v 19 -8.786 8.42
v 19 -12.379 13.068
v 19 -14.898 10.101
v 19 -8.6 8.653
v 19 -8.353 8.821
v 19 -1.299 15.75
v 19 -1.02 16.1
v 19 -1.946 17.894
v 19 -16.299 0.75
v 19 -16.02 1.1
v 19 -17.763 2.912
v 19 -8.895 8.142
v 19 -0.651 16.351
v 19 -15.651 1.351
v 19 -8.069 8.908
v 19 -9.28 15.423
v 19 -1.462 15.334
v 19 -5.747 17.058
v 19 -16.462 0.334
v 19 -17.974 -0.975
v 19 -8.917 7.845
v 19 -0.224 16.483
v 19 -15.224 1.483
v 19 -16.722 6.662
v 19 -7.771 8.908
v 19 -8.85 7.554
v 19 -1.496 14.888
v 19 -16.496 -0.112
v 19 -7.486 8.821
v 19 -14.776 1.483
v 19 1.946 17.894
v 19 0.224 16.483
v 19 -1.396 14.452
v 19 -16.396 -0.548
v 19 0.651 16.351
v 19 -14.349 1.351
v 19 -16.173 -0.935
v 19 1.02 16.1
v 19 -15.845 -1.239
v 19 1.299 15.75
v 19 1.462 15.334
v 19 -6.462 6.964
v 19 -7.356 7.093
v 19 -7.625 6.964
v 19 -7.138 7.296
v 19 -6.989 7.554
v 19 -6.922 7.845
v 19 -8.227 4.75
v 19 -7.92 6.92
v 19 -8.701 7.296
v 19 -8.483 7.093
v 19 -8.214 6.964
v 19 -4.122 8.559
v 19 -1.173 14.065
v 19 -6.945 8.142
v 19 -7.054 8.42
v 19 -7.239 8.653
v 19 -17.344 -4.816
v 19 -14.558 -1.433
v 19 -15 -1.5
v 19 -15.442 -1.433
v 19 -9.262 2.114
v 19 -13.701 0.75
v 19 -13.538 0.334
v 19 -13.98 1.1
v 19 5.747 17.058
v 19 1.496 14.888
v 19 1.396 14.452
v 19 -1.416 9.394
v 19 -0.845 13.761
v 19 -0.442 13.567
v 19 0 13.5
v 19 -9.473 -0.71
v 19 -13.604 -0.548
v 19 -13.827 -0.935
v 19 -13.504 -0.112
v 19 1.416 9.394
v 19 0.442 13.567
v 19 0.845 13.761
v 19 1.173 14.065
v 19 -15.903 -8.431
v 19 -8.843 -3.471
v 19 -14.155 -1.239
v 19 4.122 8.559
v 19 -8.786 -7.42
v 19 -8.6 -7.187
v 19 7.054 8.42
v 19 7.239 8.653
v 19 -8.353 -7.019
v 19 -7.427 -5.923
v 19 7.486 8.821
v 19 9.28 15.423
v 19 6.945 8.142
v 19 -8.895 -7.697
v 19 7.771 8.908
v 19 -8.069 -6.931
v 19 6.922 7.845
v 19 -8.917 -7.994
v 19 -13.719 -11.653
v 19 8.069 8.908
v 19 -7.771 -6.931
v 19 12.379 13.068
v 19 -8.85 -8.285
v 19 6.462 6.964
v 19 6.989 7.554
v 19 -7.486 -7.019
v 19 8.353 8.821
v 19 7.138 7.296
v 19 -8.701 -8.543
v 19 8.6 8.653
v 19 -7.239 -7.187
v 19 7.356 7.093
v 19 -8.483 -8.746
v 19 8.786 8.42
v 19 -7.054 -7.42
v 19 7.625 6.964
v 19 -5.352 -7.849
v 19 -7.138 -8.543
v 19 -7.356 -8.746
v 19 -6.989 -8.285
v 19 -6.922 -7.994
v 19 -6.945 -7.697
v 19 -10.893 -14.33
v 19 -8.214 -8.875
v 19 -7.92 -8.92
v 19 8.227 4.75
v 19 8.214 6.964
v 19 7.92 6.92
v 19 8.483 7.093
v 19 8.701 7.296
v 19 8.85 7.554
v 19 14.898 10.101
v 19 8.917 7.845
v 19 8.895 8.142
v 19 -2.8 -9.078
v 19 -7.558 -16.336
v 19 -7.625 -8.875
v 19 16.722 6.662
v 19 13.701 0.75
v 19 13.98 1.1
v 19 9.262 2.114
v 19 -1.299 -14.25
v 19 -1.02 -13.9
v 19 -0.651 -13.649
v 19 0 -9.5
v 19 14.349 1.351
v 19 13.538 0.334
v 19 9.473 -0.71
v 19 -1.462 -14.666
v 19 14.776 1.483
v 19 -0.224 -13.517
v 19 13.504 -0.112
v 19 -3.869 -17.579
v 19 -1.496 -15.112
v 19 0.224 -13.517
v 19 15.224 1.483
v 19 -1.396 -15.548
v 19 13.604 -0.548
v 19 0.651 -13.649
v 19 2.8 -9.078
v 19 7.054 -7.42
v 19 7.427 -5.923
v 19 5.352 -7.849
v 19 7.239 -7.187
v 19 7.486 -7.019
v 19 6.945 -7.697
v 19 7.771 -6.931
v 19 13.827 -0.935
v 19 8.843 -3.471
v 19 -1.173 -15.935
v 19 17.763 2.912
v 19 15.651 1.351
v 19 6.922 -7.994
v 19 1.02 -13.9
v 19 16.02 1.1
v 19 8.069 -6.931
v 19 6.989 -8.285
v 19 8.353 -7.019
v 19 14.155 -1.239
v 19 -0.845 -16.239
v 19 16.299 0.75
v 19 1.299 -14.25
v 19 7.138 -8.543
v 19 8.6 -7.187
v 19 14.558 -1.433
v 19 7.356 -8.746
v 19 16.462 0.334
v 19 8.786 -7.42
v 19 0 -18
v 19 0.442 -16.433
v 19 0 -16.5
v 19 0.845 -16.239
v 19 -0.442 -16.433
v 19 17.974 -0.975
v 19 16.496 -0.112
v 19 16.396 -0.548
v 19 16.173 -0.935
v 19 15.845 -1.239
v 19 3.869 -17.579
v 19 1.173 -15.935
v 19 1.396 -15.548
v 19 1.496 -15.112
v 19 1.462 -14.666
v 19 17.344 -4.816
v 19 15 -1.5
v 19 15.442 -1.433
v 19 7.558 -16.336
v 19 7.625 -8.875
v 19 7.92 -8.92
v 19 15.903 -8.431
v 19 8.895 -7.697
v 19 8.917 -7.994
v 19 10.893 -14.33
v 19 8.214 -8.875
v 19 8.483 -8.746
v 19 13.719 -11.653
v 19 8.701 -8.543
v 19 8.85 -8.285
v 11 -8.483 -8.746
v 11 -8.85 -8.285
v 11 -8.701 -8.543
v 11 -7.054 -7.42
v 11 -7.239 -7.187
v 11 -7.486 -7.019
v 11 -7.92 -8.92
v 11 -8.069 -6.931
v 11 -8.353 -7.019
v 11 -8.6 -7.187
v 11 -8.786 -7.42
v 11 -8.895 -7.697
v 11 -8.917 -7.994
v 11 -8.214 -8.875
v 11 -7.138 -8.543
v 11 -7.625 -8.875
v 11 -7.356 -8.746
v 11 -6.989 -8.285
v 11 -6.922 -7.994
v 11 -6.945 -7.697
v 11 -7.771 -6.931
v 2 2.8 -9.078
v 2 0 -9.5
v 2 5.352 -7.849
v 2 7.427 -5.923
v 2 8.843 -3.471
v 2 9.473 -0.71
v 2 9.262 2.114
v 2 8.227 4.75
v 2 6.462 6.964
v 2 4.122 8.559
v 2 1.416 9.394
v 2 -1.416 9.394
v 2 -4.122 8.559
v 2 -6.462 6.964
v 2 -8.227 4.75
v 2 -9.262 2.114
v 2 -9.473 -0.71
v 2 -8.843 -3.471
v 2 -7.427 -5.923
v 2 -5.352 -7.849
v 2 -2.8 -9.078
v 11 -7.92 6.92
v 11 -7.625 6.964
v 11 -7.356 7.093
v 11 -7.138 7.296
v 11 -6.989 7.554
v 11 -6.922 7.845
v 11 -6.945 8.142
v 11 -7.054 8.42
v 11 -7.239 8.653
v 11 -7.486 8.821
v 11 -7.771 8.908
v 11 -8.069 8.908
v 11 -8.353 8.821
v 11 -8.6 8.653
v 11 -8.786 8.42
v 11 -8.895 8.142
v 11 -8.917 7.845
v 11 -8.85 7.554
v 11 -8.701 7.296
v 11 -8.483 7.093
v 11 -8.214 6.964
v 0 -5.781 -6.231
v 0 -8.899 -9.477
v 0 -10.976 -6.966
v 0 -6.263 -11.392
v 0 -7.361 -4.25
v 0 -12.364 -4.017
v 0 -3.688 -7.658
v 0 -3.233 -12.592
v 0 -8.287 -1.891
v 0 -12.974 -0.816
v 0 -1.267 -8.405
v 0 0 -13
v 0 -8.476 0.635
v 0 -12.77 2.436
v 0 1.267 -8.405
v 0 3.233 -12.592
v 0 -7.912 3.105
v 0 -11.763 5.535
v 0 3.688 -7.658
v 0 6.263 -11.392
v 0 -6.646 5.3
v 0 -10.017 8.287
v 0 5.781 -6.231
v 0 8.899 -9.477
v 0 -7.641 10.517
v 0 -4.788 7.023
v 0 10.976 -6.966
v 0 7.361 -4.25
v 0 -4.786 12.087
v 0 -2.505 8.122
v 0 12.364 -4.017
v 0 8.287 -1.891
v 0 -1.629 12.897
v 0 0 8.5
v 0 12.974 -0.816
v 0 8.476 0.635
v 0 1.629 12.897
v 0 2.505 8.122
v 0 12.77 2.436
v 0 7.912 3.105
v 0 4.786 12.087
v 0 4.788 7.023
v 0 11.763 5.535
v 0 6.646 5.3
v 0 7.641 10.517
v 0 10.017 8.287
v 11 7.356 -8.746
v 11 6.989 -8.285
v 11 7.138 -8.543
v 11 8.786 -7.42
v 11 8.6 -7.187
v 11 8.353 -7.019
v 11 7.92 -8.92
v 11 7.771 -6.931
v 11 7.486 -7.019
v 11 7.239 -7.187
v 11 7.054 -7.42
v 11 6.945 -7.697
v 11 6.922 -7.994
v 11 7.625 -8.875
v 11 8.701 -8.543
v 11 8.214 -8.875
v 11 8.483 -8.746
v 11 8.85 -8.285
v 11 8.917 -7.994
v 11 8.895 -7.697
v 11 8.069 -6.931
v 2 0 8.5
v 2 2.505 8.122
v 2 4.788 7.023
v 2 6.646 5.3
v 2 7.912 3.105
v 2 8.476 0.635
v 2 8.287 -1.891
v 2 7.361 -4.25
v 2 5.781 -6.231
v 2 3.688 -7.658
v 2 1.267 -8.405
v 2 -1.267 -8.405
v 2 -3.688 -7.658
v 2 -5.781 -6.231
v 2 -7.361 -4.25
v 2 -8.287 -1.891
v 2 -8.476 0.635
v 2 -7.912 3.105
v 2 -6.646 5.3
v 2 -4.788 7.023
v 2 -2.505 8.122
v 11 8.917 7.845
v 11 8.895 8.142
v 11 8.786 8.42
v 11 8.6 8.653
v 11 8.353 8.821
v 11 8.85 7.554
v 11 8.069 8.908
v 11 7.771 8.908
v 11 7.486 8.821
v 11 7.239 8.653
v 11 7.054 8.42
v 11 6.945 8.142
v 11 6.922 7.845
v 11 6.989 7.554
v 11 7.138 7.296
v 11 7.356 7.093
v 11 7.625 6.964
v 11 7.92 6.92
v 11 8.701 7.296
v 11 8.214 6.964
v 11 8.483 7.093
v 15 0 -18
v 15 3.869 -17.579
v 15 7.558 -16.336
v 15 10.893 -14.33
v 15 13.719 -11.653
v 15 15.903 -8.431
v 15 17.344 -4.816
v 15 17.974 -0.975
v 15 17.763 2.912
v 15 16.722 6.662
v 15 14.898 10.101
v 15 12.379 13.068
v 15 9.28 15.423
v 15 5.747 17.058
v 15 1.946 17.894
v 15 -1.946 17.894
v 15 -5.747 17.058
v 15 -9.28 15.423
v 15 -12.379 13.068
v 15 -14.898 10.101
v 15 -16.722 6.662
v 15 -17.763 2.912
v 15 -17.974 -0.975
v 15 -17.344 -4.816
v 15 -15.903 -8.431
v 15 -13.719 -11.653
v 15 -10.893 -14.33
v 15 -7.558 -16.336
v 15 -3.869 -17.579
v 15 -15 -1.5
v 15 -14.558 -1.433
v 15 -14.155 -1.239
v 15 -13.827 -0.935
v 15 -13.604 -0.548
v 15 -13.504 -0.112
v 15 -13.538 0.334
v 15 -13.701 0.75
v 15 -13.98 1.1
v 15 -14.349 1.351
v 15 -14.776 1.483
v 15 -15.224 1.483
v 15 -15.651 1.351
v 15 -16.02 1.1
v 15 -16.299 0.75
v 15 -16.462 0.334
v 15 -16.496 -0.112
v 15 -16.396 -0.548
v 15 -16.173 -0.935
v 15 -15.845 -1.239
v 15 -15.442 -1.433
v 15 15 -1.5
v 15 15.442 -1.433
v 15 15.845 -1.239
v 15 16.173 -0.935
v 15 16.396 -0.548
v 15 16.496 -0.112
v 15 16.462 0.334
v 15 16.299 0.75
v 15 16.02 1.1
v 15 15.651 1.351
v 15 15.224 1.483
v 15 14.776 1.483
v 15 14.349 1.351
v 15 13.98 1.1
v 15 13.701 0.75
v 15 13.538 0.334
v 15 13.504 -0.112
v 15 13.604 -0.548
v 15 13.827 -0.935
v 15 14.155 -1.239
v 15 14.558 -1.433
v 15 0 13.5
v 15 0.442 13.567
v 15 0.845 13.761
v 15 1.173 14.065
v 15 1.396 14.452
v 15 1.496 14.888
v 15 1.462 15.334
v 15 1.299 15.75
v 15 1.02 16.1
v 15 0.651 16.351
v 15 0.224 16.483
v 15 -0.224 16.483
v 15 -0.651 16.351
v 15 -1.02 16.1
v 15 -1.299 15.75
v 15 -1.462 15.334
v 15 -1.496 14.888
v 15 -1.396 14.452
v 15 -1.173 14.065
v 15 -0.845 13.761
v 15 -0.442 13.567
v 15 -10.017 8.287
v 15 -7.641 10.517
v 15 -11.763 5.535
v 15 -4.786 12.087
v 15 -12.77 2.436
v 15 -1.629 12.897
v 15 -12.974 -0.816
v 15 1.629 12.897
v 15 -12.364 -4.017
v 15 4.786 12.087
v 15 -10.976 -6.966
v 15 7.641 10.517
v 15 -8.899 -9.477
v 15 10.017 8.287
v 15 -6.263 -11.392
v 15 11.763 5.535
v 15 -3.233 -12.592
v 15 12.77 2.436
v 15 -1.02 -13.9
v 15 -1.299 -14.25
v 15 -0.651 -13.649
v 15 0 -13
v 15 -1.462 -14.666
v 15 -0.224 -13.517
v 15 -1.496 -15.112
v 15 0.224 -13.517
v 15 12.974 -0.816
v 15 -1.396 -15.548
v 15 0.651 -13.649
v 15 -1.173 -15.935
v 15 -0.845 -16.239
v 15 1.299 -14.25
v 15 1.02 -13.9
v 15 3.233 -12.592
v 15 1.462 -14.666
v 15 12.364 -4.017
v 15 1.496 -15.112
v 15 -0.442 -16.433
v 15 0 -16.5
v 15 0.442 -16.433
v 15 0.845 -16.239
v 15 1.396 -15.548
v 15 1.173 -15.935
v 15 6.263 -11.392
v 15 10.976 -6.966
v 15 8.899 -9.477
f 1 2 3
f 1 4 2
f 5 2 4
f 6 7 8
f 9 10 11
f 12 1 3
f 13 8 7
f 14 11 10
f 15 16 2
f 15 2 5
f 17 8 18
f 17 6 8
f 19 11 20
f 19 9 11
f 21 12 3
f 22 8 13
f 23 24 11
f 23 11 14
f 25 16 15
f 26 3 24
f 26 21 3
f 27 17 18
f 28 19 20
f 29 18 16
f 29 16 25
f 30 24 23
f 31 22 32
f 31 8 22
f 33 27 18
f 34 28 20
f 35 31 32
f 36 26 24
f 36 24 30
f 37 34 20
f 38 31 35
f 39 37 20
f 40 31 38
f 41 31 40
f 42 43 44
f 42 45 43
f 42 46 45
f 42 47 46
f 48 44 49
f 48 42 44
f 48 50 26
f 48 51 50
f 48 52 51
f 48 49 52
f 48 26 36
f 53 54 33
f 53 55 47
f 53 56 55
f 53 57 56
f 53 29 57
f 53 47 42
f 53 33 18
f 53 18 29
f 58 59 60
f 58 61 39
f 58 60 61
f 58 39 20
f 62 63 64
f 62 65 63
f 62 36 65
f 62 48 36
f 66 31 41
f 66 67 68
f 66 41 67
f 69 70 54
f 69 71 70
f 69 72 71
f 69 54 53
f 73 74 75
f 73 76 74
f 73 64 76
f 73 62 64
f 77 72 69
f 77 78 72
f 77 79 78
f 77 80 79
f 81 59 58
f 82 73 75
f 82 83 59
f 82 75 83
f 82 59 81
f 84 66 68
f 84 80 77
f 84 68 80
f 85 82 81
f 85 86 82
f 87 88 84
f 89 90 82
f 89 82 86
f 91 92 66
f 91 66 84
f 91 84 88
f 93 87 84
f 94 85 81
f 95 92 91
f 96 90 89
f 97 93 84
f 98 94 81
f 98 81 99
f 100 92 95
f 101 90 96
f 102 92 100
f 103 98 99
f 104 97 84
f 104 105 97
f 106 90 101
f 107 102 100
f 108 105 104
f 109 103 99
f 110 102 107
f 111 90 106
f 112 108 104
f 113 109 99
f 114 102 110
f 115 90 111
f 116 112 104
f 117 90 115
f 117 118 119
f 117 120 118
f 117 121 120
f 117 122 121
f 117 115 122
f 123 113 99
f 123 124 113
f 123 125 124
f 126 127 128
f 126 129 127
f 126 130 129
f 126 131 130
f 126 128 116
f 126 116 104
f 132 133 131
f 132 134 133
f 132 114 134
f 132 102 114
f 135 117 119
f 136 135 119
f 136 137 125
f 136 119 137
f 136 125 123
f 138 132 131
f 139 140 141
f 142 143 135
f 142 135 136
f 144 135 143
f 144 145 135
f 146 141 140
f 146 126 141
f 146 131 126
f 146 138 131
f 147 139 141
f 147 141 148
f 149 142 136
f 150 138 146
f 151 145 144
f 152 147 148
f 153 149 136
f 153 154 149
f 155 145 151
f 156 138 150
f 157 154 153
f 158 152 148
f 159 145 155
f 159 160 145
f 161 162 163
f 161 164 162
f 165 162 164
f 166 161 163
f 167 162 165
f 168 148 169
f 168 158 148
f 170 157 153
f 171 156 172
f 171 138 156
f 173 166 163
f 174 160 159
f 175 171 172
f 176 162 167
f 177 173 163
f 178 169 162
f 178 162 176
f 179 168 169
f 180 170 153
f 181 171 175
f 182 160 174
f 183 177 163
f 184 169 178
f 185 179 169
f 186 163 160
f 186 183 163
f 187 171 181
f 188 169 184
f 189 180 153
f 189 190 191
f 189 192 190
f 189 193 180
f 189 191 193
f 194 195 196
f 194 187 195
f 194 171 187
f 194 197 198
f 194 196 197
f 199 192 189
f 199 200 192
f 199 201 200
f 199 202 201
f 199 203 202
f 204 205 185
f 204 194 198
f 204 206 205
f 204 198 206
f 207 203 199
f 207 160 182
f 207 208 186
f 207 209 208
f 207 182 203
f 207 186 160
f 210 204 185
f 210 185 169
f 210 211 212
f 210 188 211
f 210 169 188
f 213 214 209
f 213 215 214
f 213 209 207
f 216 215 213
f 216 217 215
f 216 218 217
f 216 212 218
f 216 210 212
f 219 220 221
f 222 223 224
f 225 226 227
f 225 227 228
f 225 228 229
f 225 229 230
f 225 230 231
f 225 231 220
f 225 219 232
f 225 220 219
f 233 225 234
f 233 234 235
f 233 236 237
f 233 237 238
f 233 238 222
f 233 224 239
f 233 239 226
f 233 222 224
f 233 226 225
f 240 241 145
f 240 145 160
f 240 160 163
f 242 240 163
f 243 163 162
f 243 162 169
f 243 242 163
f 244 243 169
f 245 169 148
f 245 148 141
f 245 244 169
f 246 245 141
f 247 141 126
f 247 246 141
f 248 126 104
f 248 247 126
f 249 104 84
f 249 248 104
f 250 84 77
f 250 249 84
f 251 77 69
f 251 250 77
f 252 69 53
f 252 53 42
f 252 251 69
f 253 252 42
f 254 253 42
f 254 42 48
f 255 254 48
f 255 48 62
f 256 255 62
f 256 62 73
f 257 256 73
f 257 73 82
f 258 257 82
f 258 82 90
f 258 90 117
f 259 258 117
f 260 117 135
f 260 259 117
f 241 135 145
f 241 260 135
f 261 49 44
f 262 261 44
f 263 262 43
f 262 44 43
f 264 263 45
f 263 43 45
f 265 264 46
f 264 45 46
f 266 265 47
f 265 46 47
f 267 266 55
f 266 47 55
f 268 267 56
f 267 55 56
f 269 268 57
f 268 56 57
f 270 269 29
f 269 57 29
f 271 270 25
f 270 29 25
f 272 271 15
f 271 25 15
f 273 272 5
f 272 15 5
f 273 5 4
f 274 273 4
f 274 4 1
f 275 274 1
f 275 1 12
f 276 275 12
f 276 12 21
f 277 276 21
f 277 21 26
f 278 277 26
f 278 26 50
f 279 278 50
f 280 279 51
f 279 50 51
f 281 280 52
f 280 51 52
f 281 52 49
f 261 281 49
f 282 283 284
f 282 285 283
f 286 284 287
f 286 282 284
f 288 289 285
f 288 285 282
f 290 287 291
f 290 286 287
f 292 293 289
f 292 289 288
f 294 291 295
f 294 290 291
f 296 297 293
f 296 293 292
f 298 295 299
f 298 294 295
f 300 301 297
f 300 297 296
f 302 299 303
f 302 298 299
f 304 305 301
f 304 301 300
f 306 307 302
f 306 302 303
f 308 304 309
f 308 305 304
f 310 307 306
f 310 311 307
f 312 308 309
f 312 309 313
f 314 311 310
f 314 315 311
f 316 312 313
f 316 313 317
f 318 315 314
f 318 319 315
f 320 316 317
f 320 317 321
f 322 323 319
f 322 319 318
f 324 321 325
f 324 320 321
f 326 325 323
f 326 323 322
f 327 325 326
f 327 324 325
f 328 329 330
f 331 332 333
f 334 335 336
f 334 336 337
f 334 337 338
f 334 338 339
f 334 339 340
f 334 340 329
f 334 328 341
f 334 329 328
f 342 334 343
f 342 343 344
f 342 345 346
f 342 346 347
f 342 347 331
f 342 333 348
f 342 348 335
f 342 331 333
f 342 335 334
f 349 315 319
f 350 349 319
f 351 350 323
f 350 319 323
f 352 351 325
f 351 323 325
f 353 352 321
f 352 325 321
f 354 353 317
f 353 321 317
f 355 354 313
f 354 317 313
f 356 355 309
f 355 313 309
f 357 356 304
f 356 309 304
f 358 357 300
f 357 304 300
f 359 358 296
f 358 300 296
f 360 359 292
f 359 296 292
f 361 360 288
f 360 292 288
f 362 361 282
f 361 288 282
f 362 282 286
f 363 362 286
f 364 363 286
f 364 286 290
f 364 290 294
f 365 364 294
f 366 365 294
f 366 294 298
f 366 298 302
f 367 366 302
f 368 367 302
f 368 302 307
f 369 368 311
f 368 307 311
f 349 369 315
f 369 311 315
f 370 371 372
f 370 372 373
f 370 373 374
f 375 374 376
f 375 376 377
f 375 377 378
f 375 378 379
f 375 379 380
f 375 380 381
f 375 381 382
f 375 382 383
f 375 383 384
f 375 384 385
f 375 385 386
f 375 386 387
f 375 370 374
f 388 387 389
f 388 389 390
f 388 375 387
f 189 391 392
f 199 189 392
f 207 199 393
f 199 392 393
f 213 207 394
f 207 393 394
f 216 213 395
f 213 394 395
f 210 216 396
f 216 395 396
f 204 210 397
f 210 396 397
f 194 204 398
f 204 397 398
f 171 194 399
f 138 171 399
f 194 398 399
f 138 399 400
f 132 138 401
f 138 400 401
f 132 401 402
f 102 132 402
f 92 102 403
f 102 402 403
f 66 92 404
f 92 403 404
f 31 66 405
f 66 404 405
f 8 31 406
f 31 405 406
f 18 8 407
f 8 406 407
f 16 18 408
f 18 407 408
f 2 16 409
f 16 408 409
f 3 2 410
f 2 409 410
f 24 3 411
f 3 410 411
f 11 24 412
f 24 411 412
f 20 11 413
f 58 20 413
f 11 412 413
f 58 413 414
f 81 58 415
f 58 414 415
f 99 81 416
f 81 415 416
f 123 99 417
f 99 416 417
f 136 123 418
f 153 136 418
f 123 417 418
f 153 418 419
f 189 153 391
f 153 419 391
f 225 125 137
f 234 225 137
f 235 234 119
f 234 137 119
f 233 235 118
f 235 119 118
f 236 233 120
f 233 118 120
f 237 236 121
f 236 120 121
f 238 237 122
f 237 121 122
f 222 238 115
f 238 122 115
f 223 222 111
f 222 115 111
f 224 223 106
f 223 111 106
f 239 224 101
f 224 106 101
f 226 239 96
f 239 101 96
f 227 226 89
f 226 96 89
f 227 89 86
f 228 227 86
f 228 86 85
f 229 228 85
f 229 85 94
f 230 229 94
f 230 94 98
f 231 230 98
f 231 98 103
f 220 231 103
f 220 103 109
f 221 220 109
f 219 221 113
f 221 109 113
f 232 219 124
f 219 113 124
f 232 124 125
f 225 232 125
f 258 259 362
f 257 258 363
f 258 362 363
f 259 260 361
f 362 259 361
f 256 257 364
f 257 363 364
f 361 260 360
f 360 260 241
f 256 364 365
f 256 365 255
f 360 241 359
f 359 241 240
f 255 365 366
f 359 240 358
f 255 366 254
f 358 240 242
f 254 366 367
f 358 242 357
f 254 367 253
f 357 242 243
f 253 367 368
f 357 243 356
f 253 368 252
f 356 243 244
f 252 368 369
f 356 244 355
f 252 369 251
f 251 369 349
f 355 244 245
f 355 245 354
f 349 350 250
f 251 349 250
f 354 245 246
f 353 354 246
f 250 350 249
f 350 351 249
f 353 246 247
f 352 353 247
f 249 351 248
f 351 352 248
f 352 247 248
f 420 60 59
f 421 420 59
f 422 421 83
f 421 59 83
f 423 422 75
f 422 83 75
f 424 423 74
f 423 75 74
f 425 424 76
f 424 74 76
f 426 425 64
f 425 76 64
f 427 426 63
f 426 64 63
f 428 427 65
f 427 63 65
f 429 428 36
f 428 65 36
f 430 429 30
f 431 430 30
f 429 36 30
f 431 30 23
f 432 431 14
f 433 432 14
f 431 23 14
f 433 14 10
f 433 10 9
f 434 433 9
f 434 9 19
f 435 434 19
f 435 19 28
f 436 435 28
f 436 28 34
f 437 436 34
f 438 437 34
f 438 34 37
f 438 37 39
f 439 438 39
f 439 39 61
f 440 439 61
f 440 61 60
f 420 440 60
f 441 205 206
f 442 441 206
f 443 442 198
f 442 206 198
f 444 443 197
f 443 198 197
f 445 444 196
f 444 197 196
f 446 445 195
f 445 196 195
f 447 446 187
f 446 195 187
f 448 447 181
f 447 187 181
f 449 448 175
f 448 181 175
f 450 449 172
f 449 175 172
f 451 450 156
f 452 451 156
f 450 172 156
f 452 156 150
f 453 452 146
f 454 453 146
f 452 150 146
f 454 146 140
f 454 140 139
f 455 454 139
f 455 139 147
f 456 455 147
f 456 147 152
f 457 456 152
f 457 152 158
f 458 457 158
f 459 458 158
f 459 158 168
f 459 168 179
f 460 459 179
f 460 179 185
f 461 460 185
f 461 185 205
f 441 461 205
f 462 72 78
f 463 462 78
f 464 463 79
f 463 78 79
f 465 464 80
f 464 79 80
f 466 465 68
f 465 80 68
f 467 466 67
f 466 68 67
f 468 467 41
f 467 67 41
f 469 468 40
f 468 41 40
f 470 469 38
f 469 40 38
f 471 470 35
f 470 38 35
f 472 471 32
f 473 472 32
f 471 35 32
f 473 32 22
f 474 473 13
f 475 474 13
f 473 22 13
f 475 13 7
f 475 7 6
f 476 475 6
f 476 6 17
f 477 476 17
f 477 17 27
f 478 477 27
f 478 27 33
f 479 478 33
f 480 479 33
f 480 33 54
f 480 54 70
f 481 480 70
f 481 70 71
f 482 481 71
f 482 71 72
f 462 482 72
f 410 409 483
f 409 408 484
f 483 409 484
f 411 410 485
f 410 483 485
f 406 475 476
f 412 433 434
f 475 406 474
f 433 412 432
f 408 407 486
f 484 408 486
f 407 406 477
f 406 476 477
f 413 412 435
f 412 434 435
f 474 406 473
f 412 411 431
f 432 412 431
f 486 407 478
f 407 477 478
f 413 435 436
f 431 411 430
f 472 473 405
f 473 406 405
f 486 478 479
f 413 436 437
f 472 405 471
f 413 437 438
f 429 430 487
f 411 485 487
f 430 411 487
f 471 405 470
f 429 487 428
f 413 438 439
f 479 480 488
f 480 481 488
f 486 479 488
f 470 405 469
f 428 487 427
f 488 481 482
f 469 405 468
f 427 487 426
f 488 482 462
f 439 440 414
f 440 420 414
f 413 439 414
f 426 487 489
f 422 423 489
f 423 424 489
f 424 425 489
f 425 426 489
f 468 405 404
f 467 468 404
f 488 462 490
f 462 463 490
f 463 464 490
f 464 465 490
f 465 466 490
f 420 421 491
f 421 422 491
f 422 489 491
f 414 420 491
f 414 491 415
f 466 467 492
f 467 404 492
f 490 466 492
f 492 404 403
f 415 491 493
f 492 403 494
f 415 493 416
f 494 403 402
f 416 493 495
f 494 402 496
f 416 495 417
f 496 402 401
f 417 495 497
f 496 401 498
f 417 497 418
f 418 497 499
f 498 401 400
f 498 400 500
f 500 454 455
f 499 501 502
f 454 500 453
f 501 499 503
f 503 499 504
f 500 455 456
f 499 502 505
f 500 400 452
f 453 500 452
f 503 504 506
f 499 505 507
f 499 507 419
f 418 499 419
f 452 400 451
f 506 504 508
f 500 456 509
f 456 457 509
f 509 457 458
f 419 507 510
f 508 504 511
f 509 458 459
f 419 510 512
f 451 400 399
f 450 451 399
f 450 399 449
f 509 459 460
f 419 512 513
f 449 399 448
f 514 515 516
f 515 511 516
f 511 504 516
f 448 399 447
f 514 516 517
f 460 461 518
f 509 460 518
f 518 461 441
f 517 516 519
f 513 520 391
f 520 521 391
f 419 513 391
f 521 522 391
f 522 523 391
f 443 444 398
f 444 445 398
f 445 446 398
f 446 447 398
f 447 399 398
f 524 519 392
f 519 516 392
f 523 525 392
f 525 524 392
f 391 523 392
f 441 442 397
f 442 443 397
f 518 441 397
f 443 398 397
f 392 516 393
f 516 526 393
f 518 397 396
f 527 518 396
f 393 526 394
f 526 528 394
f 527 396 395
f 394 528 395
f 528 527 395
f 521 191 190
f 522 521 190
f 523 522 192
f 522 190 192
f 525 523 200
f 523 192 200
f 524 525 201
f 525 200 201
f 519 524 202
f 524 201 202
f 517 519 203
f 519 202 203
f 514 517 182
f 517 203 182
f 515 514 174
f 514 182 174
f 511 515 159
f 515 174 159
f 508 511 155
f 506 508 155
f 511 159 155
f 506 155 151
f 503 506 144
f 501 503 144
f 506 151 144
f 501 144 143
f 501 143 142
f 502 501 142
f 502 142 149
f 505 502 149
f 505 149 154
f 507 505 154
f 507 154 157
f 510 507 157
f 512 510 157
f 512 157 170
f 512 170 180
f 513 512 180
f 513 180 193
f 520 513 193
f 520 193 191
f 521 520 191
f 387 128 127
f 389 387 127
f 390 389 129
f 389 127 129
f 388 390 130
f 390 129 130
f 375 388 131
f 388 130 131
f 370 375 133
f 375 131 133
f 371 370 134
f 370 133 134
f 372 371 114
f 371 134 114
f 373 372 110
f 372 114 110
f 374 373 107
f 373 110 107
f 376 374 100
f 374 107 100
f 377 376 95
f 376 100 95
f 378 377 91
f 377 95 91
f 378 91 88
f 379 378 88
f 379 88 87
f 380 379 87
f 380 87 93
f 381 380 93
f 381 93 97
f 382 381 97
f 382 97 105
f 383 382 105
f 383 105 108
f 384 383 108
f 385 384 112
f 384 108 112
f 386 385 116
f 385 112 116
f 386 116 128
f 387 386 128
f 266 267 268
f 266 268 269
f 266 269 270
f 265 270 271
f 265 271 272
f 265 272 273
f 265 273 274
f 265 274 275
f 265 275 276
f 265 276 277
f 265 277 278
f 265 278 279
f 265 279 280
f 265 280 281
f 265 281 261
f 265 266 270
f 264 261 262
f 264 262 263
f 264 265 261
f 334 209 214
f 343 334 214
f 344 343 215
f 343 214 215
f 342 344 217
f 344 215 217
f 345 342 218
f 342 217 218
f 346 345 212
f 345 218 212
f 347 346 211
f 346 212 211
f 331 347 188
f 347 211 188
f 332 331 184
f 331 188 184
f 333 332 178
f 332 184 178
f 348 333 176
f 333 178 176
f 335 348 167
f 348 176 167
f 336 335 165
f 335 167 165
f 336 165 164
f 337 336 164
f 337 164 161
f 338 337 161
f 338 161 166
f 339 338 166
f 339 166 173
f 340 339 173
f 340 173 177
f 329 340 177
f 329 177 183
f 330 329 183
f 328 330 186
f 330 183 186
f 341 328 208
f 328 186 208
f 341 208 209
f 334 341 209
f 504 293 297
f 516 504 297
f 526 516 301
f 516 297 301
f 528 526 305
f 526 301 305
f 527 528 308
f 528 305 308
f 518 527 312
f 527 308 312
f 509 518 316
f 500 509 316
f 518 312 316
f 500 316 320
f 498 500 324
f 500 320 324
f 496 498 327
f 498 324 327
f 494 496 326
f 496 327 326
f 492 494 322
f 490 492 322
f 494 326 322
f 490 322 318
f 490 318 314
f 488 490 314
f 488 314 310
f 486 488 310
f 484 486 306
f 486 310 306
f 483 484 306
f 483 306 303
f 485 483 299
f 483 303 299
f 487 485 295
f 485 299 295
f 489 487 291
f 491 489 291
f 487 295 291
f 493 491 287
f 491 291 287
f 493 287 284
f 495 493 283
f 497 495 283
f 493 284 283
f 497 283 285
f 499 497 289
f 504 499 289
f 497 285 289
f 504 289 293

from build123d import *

# Parameters (mm, degrees)
SKETCH1_R           = 13
SKETCH1_R_2         = 9.5
BOSS_EXTRUDE1_DEPTH = 15
SKETCH2_R           = 18
SKETCH2_R_2         = 9.5
BOSS_EXTRUDE2_DEPTH = 4
SKETCH3_R           = 9.5
SKETCH3_R_2         = 8.5
BOSS_EXTRUDE3_DEPTH = 2
SKETCH4_R           = 1.5
CUT_EXTRUDE1_DEPTH  = 32.764760349
SKETCH5_R           = 1
CUT_EXTRUDE2_DEPTH  = 8


with BuildPart() as part:
    # Sketch1 → Boss-Extrude1 (new body)
    with BuildSketch(Plane(origin=(0, 0, 0), x_dir=(0, 0, -1), z_dir=(1, 0, 0))):
        Circle(SKETCH1_R)
        Circle(SKETCH1_R_2, mode=Mode.SUBTRACT)
    extrude(amount=BOSS_EXTRUDE1_DEPTH)

    # Sketch2 → Boss-Extrude2 (add)
    with BuildSketch(Plane(origin=(15, 0, 0), x_dir=(0, 0, -1), z_dir=(1, 0, 0))):
        Circle(SKETCH2_R)
        Circle(SKETCH2_R_2, mode=Mode.SUBTRACT)
    extrude(amount=BOSS_EXTRUDE2_DEPTH)

    # Sketch3 → Boss-Extrude3 (add)
    with BuildSketch(Plane.ZY):
        Circle(SKETCH3_R)
        Circle(SKETCH3_R_2, mode=Mode.SUBTRACT)
    extrude(amount=-BOSS_EXTRUDE3_DEPTH)

    # Sketch4 → Cut-Extrude1 (cut, through all)
    with BuildSketch(Plane(origin=(19, 0, 0), x_dir=(0, 0, -1), z_dir=(1, 0, 0))):
        with Locations((0, 15)):
            Circle(SKETCH4_R)
        with Locations((15, 0)):
            Circle(SKETCH4_R)
        with Locations((0, -15)):
            Circle(SKETCH4_R)
        with Locations((-15, 0)):
            Circle(SKETCH4_R)
    extrude(amount=-CUT_EXTRUDE1_DEPTH, mode=Mode.SUBTRACT)

    # Sketch5 → Cut-Extrude2 (cut)
    with BuildSketch(Plane(origin=(19, 0, 0), x_dir=(0, 0, -1), z_dir=(1, 0, 0))):
        with Locations((7.919595949, 7.919595949)):
            Circle(SKETCH5_R)
        with Locations((7.919595949, -7.919595949)):
            Circle(SKETCH5_R)
        with Locations((-7.919595949, -7.919595949)):
            Circle(SKETCH5_R)
        with Locations((-7.919595949, 7.919595949)):
            Circle(SKETCH5_R)
    extrude(amount=-CUT_EXTRUDE2_DEPTH, mode=Mode.SUBTRACT)


solid = part.part
